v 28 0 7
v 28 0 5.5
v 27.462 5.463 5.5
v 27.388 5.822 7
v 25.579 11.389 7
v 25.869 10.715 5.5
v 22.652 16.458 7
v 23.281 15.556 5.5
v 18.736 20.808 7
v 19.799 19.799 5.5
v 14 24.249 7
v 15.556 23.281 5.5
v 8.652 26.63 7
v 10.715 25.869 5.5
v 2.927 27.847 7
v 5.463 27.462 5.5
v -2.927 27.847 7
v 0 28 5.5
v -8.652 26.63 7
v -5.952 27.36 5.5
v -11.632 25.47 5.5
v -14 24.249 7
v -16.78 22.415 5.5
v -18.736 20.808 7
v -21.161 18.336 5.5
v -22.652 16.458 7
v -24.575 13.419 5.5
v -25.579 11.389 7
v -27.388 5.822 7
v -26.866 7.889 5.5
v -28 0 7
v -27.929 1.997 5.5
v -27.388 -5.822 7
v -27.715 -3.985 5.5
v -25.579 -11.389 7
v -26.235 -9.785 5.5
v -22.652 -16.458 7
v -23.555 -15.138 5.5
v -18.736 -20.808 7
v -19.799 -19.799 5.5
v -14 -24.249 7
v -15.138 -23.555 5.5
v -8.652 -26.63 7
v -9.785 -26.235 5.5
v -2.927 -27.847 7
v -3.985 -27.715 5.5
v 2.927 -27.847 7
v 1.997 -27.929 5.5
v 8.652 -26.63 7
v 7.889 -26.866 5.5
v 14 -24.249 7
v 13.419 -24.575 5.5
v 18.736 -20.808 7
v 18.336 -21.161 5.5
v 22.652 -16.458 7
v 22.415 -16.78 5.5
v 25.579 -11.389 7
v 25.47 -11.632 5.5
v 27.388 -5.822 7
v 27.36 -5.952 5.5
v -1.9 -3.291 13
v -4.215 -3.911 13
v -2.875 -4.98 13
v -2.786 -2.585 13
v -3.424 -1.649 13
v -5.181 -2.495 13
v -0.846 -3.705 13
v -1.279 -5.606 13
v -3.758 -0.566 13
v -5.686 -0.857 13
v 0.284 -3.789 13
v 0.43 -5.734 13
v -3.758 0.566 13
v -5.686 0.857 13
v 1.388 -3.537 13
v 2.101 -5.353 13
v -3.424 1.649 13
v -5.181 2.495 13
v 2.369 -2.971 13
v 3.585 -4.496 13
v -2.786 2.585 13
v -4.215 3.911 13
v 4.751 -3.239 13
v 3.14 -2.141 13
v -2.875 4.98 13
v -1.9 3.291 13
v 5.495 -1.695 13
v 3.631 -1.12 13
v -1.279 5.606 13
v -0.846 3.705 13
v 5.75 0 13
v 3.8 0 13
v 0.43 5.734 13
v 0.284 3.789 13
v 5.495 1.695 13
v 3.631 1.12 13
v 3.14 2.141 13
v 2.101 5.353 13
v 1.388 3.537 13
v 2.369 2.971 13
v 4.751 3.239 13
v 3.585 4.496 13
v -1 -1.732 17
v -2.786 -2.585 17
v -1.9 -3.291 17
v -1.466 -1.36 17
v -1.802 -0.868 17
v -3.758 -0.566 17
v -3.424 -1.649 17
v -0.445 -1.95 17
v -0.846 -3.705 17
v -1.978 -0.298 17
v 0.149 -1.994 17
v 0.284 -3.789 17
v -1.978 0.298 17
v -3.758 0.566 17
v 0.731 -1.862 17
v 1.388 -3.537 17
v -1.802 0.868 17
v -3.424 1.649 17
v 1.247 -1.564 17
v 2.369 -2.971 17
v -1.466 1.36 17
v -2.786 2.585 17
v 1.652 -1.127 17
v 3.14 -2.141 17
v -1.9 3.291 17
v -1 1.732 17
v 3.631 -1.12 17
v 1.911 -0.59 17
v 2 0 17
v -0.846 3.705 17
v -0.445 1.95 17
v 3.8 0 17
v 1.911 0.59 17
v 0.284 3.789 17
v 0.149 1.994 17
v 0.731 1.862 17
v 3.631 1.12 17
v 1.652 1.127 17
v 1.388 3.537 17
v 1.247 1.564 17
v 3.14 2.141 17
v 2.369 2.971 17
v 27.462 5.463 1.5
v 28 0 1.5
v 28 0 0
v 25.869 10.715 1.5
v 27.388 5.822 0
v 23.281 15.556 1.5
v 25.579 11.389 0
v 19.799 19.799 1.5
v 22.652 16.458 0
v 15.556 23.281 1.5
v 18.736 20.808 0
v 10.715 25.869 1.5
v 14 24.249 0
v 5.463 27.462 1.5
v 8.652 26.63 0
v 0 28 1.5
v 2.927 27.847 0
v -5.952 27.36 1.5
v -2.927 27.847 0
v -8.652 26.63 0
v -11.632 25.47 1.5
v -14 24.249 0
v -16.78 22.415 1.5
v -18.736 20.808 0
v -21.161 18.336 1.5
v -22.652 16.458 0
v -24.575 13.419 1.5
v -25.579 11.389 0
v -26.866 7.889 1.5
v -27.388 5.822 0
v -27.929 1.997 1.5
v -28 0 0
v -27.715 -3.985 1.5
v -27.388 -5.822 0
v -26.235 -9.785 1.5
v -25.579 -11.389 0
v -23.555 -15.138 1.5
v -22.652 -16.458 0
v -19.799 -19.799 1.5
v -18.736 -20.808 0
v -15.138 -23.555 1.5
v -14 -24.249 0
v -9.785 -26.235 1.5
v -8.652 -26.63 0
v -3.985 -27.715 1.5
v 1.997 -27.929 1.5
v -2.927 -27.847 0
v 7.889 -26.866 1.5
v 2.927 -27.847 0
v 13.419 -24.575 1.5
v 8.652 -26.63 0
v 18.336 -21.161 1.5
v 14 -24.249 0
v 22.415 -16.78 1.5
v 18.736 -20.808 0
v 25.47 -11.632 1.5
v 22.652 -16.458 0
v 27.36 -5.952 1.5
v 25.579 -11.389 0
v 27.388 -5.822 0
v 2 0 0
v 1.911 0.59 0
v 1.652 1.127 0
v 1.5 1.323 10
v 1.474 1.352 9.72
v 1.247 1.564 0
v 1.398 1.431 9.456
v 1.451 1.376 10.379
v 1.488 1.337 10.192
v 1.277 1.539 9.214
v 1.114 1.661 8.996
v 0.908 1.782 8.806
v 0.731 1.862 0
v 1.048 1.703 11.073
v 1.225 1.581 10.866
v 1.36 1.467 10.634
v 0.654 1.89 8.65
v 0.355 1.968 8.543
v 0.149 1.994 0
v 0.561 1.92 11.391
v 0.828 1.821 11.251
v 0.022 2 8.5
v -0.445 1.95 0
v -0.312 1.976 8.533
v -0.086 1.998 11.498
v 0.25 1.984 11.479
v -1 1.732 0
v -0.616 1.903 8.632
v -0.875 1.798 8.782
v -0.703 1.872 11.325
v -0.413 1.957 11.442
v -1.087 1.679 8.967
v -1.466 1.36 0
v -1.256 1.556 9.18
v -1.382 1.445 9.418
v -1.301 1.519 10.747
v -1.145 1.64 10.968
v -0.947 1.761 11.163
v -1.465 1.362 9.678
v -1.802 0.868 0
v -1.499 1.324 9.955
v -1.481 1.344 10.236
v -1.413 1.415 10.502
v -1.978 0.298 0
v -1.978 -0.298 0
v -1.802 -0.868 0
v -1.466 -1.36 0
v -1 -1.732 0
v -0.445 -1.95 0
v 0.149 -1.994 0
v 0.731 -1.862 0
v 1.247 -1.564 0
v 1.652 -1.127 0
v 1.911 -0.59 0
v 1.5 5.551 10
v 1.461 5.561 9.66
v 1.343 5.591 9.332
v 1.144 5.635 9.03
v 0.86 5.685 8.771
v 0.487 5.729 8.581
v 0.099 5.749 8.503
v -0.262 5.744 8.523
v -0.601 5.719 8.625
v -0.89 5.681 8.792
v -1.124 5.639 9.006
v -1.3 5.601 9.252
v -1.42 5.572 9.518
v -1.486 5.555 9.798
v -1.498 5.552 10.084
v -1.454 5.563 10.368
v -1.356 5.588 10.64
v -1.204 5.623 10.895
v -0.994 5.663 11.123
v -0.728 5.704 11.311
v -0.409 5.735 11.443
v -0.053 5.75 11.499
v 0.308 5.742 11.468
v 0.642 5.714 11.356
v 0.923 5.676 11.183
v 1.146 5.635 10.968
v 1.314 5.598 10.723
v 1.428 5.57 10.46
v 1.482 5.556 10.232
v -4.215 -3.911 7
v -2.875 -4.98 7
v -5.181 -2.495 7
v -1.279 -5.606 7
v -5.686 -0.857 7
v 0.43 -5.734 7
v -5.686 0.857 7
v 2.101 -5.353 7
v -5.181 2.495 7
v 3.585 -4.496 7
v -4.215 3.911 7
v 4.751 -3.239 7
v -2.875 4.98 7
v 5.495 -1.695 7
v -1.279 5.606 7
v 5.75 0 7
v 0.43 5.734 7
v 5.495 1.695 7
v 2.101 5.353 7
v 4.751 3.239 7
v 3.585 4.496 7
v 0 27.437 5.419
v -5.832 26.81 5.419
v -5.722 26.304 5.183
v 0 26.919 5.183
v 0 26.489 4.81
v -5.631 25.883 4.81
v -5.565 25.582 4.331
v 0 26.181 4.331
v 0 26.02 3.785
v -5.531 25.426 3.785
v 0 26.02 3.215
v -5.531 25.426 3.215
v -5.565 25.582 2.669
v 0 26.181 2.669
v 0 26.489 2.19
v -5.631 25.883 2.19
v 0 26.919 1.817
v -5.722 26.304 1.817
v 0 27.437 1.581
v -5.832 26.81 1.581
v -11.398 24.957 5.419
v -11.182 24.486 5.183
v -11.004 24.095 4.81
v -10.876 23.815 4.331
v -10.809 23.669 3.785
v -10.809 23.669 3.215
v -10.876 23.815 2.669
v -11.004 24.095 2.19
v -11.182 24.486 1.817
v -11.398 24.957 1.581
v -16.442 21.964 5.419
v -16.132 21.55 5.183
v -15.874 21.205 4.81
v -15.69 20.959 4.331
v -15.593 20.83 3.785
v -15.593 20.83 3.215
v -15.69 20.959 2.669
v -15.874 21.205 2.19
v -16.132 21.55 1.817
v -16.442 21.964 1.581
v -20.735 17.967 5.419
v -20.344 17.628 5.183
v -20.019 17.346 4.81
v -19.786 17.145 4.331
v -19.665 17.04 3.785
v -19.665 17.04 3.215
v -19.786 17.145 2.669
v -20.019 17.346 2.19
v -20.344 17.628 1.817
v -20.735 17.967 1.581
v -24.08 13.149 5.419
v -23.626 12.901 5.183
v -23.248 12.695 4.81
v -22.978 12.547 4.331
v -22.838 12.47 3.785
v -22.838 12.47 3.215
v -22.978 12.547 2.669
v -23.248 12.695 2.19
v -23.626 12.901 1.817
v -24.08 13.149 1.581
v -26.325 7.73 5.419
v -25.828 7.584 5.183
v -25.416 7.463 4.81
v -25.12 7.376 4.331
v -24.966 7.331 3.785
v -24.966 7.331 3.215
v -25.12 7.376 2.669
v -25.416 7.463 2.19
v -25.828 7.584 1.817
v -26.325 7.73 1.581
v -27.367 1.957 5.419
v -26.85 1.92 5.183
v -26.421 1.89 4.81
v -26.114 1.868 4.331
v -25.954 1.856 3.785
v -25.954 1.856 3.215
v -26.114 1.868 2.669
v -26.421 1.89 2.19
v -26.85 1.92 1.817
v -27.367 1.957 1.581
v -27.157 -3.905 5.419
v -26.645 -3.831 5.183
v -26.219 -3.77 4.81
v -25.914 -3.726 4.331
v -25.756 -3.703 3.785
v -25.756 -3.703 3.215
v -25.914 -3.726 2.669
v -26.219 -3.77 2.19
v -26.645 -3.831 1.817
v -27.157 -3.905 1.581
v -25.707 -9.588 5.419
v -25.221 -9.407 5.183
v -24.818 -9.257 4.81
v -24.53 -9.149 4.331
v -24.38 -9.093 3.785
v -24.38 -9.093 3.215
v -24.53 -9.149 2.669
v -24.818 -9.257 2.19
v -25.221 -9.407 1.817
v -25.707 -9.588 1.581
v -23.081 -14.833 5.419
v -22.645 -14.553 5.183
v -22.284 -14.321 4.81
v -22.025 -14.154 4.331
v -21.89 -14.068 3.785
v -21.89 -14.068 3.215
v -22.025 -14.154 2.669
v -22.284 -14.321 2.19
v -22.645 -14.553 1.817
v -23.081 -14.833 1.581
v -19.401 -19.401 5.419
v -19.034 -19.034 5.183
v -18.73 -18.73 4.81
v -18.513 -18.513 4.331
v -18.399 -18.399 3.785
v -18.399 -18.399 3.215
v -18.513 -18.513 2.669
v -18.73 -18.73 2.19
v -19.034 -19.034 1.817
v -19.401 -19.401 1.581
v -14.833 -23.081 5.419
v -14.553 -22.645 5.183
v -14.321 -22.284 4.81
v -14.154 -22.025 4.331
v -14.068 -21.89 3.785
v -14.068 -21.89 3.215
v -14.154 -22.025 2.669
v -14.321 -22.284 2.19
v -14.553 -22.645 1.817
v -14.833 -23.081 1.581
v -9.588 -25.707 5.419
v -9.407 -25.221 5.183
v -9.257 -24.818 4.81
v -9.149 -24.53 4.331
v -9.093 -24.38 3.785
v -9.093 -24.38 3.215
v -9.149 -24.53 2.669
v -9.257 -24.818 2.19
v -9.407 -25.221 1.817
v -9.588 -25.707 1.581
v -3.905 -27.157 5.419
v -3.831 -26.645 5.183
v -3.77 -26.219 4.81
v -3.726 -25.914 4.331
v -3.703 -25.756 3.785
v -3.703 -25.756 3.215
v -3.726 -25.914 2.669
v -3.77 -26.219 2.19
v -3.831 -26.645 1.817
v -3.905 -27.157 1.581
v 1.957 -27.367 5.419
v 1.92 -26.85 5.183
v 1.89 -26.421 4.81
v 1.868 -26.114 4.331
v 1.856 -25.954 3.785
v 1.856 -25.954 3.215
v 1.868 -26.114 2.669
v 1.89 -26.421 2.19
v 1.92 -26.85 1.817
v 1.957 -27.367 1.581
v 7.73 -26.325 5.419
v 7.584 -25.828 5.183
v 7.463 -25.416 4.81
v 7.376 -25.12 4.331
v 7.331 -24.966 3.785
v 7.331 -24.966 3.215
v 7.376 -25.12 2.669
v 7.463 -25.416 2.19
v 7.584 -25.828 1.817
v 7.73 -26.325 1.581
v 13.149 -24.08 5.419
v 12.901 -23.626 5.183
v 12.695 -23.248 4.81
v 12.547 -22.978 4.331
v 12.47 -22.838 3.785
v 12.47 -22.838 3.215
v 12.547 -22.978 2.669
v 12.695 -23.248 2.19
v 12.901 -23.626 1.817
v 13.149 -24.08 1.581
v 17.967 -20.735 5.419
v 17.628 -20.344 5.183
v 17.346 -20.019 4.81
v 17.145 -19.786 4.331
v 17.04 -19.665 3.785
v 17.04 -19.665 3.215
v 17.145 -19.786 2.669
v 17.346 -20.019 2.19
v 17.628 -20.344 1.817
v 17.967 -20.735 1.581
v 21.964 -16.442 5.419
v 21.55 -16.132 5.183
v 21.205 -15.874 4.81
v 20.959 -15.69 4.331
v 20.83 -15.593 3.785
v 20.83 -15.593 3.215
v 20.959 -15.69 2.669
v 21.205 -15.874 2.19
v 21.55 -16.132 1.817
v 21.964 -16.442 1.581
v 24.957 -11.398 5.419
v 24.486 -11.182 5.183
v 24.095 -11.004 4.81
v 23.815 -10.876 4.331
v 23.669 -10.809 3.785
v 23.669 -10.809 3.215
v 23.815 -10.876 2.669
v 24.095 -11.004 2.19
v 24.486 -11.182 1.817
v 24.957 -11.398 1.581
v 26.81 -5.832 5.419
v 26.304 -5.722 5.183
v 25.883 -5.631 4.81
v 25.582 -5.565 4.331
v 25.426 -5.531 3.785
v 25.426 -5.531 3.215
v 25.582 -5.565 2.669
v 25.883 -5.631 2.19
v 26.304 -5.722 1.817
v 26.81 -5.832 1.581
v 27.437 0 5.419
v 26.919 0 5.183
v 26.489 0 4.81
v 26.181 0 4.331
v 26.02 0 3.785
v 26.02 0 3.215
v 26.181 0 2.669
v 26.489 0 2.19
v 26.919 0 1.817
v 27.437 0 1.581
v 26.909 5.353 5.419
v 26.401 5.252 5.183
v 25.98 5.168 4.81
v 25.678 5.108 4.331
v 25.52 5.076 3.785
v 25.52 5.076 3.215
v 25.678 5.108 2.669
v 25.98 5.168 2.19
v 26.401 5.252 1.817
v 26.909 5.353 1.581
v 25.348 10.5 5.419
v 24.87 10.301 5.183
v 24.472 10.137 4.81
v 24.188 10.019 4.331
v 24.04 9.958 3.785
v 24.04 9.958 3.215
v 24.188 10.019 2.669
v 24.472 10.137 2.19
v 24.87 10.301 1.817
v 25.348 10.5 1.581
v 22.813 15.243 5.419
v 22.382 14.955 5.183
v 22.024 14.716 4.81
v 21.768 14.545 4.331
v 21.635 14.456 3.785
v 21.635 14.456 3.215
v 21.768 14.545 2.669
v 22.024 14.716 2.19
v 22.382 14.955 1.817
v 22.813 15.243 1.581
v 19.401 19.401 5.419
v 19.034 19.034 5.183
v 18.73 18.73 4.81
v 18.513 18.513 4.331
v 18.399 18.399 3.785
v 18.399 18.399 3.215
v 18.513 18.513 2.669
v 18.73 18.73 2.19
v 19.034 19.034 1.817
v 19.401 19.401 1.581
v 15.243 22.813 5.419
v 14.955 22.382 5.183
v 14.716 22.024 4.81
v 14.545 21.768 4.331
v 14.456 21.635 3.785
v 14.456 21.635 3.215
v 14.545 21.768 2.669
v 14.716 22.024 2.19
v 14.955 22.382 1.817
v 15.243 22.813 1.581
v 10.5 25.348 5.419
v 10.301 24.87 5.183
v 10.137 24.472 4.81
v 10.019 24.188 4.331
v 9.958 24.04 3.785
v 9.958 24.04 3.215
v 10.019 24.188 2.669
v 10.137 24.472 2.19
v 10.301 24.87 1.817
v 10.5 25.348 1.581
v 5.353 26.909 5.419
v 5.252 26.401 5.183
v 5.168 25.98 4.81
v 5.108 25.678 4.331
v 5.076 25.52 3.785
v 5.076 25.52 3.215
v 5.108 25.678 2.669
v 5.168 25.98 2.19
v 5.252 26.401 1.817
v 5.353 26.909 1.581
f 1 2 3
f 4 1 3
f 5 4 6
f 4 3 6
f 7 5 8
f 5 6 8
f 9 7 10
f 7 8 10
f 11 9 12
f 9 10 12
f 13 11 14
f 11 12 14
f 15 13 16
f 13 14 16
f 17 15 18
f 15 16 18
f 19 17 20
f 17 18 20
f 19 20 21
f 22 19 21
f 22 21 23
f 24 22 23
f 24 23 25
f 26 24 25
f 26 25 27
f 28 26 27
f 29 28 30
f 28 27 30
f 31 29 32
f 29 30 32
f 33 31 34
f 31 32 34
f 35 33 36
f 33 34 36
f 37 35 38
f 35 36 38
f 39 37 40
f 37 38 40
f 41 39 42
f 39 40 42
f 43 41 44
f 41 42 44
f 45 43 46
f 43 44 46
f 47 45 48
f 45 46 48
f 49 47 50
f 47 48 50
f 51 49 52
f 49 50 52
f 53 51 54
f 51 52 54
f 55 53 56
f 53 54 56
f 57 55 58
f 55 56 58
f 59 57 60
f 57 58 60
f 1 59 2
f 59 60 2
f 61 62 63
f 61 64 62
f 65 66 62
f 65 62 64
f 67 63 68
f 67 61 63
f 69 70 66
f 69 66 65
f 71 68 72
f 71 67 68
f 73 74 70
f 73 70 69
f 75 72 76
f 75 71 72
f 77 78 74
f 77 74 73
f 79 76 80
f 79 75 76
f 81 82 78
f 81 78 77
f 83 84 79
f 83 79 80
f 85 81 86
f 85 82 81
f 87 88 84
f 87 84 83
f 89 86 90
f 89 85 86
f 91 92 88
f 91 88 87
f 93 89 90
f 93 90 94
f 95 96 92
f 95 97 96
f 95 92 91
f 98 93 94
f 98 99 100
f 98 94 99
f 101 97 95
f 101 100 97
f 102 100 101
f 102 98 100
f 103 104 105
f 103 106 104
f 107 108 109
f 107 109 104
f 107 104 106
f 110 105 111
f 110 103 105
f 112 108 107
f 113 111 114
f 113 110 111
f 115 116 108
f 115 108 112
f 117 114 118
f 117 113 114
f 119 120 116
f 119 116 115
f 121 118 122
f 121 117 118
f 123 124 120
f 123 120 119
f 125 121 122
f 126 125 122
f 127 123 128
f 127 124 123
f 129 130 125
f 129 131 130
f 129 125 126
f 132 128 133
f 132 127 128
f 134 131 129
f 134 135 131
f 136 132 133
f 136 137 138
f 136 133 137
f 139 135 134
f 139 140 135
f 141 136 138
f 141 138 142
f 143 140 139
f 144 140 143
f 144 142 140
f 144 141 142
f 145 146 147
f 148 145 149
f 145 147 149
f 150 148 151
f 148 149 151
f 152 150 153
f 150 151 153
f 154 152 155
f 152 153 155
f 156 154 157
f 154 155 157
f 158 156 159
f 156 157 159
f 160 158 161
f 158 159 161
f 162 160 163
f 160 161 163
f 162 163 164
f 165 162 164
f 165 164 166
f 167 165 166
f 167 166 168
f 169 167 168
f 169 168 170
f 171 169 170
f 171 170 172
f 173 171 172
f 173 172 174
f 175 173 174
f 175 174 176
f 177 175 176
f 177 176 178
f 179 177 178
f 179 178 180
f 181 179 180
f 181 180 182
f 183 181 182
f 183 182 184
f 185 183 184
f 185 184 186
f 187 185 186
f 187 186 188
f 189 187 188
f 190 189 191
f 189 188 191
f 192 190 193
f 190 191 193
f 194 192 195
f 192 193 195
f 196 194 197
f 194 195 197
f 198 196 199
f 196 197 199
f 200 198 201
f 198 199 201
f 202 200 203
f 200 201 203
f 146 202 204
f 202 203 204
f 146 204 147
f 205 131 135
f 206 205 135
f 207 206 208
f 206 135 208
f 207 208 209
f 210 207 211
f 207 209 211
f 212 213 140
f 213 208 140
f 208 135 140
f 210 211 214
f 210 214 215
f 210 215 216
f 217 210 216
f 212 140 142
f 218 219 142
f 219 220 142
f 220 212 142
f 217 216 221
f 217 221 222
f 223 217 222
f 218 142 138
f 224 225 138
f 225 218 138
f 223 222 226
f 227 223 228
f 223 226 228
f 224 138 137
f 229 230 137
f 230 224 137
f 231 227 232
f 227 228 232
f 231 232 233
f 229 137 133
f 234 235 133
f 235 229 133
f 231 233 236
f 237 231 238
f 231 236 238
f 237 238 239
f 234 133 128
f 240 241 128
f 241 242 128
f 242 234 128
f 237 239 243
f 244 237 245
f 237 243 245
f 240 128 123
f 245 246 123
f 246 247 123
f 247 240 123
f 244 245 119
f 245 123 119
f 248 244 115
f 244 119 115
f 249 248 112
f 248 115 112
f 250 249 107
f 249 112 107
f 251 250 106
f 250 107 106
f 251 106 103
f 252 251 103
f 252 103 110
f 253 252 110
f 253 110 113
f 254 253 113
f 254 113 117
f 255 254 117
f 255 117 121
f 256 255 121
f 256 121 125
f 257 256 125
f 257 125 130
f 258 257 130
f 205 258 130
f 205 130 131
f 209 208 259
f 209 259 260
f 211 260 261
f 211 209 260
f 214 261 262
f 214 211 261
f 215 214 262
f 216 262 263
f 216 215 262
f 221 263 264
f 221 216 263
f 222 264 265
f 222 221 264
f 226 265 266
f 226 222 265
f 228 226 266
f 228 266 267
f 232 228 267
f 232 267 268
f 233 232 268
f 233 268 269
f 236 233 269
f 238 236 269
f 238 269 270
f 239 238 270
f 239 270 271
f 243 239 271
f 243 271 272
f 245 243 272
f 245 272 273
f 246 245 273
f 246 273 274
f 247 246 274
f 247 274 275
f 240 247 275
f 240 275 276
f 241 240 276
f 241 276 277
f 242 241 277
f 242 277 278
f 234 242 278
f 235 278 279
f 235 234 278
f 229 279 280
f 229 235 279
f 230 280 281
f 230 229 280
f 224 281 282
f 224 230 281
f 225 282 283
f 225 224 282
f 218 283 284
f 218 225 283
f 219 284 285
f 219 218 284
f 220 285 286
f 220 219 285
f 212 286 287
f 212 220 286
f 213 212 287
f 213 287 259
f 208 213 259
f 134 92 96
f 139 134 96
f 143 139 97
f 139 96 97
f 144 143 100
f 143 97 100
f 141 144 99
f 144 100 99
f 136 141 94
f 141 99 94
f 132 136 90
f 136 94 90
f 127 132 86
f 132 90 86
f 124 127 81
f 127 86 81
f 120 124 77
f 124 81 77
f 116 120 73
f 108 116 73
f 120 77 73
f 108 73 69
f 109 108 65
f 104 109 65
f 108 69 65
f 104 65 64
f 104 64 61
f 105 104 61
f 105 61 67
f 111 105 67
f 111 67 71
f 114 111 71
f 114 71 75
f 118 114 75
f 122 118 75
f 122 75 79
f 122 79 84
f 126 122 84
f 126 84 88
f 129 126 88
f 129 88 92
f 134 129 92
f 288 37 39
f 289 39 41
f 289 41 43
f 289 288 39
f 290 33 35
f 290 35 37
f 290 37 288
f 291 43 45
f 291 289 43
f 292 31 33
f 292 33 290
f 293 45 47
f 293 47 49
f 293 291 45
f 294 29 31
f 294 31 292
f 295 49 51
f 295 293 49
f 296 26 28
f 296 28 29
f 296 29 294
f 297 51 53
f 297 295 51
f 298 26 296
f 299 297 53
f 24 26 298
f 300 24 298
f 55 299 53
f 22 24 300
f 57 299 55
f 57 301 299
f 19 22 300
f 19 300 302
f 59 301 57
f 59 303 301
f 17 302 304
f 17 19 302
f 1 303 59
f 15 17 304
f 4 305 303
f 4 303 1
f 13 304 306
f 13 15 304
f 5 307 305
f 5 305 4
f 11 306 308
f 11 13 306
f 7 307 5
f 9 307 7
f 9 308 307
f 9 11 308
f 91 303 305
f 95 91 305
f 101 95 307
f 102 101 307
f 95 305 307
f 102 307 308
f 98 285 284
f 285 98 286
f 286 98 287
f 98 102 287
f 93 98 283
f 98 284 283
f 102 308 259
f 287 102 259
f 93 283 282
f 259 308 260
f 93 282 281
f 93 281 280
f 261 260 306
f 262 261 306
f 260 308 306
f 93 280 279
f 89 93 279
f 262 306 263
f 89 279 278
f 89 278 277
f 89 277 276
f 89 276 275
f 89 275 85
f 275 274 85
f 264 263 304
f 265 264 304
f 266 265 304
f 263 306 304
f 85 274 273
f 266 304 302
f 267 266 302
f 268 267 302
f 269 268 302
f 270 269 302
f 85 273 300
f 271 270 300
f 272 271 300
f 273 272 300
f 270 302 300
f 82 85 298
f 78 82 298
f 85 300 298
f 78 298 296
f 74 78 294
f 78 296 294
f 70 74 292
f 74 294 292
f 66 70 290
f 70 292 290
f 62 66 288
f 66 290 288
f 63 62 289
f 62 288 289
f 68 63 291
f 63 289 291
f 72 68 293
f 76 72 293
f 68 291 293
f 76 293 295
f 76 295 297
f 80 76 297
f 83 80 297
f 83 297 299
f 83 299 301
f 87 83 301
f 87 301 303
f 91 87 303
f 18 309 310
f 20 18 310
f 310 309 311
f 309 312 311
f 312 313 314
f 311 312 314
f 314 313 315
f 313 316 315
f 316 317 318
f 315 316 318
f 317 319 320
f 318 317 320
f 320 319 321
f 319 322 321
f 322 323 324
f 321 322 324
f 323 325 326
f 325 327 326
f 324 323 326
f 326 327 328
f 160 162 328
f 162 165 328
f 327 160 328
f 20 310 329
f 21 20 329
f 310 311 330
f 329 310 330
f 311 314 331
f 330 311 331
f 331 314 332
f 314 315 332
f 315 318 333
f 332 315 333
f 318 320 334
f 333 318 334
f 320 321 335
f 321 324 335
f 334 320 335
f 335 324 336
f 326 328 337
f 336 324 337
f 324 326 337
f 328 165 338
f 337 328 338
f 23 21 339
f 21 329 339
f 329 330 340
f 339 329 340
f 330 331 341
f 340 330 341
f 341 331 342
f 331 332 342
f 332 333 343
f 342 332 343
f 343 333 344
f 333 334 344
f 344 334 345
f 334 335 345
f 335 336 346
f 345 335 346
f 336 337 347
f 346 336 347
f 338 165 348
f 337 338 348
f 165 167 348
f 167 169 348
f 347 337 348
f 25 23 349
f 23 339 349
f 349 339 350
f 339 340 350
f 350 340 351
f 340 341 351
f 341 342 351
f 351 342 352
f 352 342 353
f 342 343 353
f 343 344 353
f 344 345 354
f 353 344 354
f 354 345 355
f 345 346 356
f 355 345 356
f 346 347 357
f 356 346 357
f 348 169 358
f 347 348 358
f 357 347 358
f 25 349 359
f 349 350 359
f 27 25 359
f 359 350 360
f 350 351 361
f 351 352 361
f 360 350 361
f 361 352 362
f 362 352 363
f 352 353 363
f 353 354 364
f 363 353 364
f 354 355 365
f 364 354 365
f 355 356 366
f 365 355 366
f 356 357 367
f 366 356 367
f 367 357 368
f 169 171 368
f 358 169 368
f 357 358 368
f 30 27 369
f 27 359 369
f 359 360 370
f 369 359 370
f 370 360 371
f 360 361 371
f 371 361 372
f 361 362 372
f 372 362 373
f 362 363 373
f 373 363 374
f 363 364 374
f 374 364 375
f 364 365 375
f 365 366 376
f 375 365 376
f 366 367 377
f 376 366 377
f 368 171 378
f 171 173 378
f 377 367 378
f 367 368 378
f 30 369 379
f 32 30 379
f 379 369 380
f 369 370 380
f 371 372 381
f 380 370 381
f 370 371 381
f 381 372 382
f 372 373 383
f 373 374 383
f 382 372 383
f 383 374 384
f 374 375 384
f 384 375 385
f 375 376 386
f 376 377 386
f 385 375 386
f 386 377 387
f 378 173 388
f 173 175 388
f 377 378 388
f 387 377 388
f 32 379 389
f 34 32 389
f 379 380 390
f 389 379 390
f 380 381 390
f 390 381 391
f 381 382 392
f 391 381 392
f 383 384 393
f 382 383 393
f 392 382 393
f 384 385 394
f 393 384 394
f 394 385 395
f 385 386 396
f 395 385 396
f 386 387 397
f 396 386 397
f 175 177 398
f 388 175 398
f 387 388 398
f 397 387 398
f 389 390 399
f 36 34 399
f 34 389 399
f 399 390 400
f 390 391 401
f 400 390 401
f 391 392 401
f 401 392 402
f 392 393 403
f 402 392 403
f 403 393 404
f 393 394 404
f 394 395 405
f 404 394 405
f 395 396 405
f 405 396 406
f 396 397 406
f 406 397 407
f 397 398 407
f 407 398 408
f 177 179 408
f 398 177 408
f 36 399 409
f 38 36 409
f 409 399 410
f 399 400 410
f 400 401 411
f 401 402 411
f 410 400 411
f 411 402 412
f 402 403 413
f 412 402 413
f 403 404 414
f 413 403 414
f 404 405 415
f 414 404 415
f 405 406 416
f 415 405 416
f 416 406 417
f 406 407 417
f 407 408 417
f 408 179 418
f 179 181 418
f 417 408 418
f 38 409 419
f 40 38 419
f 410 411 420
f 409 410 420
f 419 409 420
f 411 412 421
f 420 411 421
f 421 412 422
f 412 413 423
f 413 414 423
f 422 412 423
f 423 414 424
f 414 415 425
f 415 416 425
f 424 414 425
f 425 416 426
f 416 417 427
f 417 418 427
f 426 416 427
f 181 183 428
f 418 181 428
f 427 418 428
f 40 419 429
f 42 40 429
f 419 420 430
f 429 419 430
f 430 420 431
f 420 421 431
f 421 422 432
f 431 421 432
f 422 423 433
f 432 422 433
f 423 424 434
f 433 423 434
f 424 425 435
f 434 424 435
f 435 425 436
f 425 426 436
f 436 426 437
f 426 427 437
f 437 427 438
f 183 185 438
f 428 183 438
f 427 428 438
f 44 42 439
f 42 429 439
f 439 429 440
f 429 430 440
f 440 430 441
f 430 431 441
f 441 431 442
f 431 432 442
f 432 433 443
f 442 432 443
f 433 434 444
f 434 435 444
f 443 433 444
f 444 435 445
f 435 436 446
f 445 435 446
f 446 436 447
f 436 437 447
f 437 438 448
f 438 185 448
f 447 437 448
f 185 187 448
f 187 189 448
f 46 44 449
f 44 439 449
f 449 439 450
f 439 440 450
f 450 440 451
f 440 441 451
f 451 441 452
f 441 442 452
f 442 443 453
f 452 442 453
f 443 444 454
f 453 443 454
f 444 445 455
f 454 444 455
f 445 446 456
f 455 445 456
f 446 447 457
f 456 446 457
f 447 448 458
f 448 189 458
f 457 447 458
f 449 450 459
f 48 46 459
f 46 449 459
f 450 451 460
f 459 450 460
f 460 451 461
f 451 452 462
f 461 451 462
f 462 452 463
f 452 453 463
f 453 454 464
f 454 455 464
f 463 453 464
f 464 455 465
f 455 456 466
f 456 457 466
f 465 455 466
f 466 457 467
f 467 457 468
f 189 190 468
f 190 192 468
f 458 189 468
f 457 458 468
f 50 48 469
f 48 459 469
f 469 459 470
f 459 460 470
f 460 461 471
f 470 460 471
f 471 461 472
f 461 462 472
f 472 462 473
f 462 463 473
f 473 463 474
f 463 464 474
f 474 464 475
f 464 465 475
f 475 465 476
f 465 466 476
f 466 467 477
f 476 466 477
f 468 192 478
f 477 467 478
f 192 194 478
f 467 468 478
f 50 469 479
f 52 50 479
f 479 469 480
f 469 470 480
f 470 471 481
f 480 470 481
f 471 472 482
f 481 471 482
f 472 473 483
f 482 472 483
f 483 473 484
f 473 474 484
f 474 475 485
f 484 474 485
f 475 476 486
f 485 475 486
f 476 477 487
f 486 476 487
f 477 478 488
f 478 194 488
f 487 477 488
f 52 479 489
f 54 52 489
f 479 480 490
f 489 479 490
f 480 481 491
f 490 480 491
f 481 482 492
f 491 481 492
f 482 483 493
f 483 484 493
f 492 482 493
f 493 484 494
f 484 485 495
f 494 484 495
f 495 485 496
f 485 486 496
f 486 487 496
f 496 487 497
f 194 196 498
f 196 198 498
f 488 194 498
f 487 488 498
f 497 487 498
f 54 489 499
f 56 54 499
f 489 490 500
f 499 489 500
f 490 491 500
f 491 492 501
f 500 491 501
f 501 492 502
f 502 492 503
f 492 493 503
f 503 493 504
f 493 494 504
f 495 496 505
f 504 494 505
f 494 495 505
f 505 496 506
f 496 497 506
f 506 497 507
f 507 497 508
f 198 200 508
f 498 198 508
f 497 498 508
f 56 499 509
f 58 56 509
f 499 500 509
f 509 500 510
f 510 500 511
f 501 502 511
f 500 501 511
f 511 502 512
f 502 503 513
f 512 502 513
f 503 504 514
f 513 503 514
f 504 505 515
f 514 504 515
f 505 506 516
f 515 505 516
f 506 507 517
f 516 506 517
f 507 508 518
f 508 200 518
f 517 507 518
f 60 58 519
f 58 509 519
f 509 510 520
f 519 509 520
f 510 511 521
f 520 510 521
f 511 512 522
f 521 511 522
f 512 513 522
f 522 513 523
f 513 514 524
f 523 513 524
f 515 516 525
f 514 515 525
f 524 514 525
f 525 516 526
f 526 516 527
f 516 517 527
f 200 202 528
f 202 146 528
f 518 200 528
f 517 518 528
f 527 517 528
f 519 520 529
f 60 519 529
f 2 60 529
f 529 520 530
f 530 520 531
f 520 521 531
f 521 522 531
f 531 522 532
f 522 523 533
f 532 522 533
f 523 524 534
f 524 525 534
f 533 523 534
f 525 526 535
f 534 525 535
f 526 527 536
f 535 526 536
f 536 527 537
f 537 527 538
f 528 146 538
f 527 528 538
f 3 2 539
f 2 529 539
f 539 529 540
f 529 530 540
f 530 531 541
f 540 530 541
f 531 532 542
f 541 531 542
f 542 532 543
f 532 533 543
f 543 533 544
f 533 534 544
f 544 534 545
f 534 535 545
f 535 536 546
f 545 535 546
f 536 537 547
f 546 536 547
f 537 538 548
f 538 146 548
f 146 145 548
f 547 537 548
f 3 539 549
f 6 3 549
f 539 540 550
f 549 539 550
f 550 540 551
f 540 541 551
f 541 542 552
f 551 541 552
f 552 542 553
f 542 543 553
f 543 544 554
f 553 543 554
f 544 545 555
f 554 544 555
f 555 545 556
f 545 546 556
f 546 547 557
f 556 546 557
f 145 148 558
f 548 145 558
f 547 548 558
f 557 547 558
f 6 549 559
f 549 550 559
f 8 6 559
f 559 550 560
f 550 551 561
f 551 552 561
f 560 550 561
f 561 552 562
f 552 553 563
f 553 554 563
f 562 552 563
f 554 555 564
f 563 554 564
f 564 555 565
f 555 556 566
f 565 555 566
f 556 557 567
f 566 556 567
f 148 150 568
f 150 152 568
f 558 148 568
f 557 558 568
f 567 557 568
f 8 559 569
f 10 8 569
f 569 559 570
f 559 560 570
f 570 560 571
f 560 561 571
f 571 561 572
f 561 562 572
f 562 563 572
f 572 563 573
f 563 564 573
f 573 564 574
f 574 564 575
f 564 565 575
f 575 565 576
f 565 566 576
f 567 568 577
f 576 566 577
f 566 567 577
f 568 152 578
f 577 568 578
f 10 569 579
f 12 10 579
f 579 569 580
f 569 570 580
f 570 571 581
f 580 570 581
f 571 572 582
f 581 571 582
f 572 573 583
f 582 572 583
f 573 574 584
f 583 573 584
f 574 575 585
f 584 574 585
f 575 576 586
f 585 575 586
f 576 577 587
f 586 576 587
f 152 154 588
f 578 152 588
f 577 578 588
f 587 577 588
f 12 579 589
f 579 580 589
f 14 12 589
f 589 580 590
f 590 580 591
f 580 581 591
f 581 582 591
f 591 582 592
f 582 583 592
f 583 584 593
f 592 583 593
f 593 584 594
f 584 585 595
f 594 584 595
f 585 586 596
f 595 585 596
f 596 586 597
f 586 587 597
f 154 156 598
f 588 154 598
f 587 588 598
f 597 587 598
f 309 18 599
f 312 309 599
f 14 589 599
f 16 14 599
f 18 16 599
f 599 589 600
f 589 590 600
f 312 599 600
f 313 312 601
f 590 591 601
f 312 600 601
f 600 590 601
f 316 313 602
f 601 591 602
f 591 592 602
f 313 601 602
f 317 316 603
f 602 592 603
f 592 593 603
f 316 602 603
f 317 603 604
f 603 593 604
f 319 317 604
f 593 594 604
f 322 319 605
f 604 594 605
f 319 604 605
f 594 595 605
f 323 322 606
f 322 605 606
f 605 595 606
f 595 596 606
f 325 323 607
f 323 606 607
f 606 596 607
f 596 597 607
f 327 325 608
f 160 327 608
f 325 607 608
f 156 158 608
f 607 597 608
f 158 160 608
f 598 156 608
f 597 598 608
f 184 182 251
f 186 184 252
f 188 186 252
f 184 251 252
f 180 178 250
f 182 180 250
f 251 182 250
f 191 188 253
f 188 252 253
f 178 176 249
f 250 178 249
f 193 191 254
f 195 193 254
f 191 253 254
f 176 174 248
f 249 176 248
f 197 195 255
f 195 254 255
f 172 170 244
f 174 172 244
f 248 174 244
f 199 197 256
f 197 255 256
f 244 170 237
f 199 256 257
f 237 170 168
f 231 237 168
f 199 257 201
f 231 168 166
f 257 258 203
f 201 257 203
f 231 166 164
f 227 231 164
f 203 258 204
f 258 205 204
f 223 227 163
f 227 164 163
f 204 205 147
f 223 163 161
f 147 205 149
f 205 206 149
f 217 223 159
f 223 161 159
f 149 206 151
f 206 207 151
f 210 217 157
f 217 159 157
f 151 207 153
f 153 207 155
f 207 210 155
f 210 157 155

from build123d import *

# Parameters (mm, degrees)
ESQUISSE1_R             = 28
BOSS_EXTRU_1_DEPTH      = 7
ESQUISSE2_R             = 3.8
BOSS_EXTRU_2_DEPTH      = 10
ESQUISSE3_R             = 2
ENL_V_MAT_EXTRU_1_DEPTH = 18
ESQUISSE4_R             = 2
ESQUISSE5_R             = 5.75
ESQUISSE5_R_2           = 3.8
BOSS_EXTRU_3_DEPTH      = 6
ENL_V_MAT_EXTRU_2_REACH = 30
ESQUISSE6_R             = 1.5


with BuildPart() as part:
    # Esquisse1 → Boss.-Extru.1 (new body)
    with BuildSketch(Plane.XY):
        Circle(ESQUISSE1_R)
    extrude(amount=BOSS_EXTRU_1_DEPTH)

    # Esquisse2 → Boss.-Extru.2 (add)
    with BuildSketch(Plane.XY.offset(7)):
        Circle(ESQUISSE2_R)
    extrude(amount=BOSS_EXTRU_2_DEPTH)

    # Esquisse3 → Enlèv. mat.-Extru.1 (cut, through all)
    with BuildSketch(Plane.XY.offset(17)):
        Circle(ESQUISSE3_R)
    extrude(amount=-ENL_V_MAT_EXTRU_1_DEPTH, mode=Mode.SUBTRACT)

    # Esquisse4 → Enlèvement de matière-Révolution1 (revolve, cut)
    with BuildSketch(Plane(origin=(0, 0, 0), x_dir=(0, 0, -1), z_dir=(1, 0, 0))):
        with Locations((-3.5, 28)):
            Circle(ESQUISSE4_R)
    revolve(axis=Axis((0, 0, 0), (0, 0, 1)), mode=Mode.SUBTRACT)

    # Esquisse5 → Boss.-Extru.3 (add)
    with BuildSketch(Plane.XY.offset(7)):
        Circle(ESQUISSE5_R)
        Circle(ESQUISSE5_R_2, mode=Mode.SUBTRACT)
    extrude(amount=BOSS_EXTRU_3_DEPTH)

    # Esquisse6 → Enlèv. mat.-Extru.2 (cut, up to next)
    with BuildSketch(Plane(origin=(0, 0, 0), x_dir=(1, 0, 0), z_dir=(0, 1, 0)), mode=Mode.PRIVATE) as enl_v_mat_extru_2_sk1:
        with Locations((0, -10)):
            Circle(ESQUISSE6_R)
    enl_v_mat_extru_2_tool1 = extrude(enl_v_mat_extru_2_sk1.sketch, amount=ENL_V_MAT_EXTRU_2_REACH, mode=Mode.PRIVATE) & part.part
    add(enl_v_mat_extru_2_tool1.solids().sort_by_distance((0, 0, 10))[0], mode=Mode.SUBTRACT)


solid = part.part
